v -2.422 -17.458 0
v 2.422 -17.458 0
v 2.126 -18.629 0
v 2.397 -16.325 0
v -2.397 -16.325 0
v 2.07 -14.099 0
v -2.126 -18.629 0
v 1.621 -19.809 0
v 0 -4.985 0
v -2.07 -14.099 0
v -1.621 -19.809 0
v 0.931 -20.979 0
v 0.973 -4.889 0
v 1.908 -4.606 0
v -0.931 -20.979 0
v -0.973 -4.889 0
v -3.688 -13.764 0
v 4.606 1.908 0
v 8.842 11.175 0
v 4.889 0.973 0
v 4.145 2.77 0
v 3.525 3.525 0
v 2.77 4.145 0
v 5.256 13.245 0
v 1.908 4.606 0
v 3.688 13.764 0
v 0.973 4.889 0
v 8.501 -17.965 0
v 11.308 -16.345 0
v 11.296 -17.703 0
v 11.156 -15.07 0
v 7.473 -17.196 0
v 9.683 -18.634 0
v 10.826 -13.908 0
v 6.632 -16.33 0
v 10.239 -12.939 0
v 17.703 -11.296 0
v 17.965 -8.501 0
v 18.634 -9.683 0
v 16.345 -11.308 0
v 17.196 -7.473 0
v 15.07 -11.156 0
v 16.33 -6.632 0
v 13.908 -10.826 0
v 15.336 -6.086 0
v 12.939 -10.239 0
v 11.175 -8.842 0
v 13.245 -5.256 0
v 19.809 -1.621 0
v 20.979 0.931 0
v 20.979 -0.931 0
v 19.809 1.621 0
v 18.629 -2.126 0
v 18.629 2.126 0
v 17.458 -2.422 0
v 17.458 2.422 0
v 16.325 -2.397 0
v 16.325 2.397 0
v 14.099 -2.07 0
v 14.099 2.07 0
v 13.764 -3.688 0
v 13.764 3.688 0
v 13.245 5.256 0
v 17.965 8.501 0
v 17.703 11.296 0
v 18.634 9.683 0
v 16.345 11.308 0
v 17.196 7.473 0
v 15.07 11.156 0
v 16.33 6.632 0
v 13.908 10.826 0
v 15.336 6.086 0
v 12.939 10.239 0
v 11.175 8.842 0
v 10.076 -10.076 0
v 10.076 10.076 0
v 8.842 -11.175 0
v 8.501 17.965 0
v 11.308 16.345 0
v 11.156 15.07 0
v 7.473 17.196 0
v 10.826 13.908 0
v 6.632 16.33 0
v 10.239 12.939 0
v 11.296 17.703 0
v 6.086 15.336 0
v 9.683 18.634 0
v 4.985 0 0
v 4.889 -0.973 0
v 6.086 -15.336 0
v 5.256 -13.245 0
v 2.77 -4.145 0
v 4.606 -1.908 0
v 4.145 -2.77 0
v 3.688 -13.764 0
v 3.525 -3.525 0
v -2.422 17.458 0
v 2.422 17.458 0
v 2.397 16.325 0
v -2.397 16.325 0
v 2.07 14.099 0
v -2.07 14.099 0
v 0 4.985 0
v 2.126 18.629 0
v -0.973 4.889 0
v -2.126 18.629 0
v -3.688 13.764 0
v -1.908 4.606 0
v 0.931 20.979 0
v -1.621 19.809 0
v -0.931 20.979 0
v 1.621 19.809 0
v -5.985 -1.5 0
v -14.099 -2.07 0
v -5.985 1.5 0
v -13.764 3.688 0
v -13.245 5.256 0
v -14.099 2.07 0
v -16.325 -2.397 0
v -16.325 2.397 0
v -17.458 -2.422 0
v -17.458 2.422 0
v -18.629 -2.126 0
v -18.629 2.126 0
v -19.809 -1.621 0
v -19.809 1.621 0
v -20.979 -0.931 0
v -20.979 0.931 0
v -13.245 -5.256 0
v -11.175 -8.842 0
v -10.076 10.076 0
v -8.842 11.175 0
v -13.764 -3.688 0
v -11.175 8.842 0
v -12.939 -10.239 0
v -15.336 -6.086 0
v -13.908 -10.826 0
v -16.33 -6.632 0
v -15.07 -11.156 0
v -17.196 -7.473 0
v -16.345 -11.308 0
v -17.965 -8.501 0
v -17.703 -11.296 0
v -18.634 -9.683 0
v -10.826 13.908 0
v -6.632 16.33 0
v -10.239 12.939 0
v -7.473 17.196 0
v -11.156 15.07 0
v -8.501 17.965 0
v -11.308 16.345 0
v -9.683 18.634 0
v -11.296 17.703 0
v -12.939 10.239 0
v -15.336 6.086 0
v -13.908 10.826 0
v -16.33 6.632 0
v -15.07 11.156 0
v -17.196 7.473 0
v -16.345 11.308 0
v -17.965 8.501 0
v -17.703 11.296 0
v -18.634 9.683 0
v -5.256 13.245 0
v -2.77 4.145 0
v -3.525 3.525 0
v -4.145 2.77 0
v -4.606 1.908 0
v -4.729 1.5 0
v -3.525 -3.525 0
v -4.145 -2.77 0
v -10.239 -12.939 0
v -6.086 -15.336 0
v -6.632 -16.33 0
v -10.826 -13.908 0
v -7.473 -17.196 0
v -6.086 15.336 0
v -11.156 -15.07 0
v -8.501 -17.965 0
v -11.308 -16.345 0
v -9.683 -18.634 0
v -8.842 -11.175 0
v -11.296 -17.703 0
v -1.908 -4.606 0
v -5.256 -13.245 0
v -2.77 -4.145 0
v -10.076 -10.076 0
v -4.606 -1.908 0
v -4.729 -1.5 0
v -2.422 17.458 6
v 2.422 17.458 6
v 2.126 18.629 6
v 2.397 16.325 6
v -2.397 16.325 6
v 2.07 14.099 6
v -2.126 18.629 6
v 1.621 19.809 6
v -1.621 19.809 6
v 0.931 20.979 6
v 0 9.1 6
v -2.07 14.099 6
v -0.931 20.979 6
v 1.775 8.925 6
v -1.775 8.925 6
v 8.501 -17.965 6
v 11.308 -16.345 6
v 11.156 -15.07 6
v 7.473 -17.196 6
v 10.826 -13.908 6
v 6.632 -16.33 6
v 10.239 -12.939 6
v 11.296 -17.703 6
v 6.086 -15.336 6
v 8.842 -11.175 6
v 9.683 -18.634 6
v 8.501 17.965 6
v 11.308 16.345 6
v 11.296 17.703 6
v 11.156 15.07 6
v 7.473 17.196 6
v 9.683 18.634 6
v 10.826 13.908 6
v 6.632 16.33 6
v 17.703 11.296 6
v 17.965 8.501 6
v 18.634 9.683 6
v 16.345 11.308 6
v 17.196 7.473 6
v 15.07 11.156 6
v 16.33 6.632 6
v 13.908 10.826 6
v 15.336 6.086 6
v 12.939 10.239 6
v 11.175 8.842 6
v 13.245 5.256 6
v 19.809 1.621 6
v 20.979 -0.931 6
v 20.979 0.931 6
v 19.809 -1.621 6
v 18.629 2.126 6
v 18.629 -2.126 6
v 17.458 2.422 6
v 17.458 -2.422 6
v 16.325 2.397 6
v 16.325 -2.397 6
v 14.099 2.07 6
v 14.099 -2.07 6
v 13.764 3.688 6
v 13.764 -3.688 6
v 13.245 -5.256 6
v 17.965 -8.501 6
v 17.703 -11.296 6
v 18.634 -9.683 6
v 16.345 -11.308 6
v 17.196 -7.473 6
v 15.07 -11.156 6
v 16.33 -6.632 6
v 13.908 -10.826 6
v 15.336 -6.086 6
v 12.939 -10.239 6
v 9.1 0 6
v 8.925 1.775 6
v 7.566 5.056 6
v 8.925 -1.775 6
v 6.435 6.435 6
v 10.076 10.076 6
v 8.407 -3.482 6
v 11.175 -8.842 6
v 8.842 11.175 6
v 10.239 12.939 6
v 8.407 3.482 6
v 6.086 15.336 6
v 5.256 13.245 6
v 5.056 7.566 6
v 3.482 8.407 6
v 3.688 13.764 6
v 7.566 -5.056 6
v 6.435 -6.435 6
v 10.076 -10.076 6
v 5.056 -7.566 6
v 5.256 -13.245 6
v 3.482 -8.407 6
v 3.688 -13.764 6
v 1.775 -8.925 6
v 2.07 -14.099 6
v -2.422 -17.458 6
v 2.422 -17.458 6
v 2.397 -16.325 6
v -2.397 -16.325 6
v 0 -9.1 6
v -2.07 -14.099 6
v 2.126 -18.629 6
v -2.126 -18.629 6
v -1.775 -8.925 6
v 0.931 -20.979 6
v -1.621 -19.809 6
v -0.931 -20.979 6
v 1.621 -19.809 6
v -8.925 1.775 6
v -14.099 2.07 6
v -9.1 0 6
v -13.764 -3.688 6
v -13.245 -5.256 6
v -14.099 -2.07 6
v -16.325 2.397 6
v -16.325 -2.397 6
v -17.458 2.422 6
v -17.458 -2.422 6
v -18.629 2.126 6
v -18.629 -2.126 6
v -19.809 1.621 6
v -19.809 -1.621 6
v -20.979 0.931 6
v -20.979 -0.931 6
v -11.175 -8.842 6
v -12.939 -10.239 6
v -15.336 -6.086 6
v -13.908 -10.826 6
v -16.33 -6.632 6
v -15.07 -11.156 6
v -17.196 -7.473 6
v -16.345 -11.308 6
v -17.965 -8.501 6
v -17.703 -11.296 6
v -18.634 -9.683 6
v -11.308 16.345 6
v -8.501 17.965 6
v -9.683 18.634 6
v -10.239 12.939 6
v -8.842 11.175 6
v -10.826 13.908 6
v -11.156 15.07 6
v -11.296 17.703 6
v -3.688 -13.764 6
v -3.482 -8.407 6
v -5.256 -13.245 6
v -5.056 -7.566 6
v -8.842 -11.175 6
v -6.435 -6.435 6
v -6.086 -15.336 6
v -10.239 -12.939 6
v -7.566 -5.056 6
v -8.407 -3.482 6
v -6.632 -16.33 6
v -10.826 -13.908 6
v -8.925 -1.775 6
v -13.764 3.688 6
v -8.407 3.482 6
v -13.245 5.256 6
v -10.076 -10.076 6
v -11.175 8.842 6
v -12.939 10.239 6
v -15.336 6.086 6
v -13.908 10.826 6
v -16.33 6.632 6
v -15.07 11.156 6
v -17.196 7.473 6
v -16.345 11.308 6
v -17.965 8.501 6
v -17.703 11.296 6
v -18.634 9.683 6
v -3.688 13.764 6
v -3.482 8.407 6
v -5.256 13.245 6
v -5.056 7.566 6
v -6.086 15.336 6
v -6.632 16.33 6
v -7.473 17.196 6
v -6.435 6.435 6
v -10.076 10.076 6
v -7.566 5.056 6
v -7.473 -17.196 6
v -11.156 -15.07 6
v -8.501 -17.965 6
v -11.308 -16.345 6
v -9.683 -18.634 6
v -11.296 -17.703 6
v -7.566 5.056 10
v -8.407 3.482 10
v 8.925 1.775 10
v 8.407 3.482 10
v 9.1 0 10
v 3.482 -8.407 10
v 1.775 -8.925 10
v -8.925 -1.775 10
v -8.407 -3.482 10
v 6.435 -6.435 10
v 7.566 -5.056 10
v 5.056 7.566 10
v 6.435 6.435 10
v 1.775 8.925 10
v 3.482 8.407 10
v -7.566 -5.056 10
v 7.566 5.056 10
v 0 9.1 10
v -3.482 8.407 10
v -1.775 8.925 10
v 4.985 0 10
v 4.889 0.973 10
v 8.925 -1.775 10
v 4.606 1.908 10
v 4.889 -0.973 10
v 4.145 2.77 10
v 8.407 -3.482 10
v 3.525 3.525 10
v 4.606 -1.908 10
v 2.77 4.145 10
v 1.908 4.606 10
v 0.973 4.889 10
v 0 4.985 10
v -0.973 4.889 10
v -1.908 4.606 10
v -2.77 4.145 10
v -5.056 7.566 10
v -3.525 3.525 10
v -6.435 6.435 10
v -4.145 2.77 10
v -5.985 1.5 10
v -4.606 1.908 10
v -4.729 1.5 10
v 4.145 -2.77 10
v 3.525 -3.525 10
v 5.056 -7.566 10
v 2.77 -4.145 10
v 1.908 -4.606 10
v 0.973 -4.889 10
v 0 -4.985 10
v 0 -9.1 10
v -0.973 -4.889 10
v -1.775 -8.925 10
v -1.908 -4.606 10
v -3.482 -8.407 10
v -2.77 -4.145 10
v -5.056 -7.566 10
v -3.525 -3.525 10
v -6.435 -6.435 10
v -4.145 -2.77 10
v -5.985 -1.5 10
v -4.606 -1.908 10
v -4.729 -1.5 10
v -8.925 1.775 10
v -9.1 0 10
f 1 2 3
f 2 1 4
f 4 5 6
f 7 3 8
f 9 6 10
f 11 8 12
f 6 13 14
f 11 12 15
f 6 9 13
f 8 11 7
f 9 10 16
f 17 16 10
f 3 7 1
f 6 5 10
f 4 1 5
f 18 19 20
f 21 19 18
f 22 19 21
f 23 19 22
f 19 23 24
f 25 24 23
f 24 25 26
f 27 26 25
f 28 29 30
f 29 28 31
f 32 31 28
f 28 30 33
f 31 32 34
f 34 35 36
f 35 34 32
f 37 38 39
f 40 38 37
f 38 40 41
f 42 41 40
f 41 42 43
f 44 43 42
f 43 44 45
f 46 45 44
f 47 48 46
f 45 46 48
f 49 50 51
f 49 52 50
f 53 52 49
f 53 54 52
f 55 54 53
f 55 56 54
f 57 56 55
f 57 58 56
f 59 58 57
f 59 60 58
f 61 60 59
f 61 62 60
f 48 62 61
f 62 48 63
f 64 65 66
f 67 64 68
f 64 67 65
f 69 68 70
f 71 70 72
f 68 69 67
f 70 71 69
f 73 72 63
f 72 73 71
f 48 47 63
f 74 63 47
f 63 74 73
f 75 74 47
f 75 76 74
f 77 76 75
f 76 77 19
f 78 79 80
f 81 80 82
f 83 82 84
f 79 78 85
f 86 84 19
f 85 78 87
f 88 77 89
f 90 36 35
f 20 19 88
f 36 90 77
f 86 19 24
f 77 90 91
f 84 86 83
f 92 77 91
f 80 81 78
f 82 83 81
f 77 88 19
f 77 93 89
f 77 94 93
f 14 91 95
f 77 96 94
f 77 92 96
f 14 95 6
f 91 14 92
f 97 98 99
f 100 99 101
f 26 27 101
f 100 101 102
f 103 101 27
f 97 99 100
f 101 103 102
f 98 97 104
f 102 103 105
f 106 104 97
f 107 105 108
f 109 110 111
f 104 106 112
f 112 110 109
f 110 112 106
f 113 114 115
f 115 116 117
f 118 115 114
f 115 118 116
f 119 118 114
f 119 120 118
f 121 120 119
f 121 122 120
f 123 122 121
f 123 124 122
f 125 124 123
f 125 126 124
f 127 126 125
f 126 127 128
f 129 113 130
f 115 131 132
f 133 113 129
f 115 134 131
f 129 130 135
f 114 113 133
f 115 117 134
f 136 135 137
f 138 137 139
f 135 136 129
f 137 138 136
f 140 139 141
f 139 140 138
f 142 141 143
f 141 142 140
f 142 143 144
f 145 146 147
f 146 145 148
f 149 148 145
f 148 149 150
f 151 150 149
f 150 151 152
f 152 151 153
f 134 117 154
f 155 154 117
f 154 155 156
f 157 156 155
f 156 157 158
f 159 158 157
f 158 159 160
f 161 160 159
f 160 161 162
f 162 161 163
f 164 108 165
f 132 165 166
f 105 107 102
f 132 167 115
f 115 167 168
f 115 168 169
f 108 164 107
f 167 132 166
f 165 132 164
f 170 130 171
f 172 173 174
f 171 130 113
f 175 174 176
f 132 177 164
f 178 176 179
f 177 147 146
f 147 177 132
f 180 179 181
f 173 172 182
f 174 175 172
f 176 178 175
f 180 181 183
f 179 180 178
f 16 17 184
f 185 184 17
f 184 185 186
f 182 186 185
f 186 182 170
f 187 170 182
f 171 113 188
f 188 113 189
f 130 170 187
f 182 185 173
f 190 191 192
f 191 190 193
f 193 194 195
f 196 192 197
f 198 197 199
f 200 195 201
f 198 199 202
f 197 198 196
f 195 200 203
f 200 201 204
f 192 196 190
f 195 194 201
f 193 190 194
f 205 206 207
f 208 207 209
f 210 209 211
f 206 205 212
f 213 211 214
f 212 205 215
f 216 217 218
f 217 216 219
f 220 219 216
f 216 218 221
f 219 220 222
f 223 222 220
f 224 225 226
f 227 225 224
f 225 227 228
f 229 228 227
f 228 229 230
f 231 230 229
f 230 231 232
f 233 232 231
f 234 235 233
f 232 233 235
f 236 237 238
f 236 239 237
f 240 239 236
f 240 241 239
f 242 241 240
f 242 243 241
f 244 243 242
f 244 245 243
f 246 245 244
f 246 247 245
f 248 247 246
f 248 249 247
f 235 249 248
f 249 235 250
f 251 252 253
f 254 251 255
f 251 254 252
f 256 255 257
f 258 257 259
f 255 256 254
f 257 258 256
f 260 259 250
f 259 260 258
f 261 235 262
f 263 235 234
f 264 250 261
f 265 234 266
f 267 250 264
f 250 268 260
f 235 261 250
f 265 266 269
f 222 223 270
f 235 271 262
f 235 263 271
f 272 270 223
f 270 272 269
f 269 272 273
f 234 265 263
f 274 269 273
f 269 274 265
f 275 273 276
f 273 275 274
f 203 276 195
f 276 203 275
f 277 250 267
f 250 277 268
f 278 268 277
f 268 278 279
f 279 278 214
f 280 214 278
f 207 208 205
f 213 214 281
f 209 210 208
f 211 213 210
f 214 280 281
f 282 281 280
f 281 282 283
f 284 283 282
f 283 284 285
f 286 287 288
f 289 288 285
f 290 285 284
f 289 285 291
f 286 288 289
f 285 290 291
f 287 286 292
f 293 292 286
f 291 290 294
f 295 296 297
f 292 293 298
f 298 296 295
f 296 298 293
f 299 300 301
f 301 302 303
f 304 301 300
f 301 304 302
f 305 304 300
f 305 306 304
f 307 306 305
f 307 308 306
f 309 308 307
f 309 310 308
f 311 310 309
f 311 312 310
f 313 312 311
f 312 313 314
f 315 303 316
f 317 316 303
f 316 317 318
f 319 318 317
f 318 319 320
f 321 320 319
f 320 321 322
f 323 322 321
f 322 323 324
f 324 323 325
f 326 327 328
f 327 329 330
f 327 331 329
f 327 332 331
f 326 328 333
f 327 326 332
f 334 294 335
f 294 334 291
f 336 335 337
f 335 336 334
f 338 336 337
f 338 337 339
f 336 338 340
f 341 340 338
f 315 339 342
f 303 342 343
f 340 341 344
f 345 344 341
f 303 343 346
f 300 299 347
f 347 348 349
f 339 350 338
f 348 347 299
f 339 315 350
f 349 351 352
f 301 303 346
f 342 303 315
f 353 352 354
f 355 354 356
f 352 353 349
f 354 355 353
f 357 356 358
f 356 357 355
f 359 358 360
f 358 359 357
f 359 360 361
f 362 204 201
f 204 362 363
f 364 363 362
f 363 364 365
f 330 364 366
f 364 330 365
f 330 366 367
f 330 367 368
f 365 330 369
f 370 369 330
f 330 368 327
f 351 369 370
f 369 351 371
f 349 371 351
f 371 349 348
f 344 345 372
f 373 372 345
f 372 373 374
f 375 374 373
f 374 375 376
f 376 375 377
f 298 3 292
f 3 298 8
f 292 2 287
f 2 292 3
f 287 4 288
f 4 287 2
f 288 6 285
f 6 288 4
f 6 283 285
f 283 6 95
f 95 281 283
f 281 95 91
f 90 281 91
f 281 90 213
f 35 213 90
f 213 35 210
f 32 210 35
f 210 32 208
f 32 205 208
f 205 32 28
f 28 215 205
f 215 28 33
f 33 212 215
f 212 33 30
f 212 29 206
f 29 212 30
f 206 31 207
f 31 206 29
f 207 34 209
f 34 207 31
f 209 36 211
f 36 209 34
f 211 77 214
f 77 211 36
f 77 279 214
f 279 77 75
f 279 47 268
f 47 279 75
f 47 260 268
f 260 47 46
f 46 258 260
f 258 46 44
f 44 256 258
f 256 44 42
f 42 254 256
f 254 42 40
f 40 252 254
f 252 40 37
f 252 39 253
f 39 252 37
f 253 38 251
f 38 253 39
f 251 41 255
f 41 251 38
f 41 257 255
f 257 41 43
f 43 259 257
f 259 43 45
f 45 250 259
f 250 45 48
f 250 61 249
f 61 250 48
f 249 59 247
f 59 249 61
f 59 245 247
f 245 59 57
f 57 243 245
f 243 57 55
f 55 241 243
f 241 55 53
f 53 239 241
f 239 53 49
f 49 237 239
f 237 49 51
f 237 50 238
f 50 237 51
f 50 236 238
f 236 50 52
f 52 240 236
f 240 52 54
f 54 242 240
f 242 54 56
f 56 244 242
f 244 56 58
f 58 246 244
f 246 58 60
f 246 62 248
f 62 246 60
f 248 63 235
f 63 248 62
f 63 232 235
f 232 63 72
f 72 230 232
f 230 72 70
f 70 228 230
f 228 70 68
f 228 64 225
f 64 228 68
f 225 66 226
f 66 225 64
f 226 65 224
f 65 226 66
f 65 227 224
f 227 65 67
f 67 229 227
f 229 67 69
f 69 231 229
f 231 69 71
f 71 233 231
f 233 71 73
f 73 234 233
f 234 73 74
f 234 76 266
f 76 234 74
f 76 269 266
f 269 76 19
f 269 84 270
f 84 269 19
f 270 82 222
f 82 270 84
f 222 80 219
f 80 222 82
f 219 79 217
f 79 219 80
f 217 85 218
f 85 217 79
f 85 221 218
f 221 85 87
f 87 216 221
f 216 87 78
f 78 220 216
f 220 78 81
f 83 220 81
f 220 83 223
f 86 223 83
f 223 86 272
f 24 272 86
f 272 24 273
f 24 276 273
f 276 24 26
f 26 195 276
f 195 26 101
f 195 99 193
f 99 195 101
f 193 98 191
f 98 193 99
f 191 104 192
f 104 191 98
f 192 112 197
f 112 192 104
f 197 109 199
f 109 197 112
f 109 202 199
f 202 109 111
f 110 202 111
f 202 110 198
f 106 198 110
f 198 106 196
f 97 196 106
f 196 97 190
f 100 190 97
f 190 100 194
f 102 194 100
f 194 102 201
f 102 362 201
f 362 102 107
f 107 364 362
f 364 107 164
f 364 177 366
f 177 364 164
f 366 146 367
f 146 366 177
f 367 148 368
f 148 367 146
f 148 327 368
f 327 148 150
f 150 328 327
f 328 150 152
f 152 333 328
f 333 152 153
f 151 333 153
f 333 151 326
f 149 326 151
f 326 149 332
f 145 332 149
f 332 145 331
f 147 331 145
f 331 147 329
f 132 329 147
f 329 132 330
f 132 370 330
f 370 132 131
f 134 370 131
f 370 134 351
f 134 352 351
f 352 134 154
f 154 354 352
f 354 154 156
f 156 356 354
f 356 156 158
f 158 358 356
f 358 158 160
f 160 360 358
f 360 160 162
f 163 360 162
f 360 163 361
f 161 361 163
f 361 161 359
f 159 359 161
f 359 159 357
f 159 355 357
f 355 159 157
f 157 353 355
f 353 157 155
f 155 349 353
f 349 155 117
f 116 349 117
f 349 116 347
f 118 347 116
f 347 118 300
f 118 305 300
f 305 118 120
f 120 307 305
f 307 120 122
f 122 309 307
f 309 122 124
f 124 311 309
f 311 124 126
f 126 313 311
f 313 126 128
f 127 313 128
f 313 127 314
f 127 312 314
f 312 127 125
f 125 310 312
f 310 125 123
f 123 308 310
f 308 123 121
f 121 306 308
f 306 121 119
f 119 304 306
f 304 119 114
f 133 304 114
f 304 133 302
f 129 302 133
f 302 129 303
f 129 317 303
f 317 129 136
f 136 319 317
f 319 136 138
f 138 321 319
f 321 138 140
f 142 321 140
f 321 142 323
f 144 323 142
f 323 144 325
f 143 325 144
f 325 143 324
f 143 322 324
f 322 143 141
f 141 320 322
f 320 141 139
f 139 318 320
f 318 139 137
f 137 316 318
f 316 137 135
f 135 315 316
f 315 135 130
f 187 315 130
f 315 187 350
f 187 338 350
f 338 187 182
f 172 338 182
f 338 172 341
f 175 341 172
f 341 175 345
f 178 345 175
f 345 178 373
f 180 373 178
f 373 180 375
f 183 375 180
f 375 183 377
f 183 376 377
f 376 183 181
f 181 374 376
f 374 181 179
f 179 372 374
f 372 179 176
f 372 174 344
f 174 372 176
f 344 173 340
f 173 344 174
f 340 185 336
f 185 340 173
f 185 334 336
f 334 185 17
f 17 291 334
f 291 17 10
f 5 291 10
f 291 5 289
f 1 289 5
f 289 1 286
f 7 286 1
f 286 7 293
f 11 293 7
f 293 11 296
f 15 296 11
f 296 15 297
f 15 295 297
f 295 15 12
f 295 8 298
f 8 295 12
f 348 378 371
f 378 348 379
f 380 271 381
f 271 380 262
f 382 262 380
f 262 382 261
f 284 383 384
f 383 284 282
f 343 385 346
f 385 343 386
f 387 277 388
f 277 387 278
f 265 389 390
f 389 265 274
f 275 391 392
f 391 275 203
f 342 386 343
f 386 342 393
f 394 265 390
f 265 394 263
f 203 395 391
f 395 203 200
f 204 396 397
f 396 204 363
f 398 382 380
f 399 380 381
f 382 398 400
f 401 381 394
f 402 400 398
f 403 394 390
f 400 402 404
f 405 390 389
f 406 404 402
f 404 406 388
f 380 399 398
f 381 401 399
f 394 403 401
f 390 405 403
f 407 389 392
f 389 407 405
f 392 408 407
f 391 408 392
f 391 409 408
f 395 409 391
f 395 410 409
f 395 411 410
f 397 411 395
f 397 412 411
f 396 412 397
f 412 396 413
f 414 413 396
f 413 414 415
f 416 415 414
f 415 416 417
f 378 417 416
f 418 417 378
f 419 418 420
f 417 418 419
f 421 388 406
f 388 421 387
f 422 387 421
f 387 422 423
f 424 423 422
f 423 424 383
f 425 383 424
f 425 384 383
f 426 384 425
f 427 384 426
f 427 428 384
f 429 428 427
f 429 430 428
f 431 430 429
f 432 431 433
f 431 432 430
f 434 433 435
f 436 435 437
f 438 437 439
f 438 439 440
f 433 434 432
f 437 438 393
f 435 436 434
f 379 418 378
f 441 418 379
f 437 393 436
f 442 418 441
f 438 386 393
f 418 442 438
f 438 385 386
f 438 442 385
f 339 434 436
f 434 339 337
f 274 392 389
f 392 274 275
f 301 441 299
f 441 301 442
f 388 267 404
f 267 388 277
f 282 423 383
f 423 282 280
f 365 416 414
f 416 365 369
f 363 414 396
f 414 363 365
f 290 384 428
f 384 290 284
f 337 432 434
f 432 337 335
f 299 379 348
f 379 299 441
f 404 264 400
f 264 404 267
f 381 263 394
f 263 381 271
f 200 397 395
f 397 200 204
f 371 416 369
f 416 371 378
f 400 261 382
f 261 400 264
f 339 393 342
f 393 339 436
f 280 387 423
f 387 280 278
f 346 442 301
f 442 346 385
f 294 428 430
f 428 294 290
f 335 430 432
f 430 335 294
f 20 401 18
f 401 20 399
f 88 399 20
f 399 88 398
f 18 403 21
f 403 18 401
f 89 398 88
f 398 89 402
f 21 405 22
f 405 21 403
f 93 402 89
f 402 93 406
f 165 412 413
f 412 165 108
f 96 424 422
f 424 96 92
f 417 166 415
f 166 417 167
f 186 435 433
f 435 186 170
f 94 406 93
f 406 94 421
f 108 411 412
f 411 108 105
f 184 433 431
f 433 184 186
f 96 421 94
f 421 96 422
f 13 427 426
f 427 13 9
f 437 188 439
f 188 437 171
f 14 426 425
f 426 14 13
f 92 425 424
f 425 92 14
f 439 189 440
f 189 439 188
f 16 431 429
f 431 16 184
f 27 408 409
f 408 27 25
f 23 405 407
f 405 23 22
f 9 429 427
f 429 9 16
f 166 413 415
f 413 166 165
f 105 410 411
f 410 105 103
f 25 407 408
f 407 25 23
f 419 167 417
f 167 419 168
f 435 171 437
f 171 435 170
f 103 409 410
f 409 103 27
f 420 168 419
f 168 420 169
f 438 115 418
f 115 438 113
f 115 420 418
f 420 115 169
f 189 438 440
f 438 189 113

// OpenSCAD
$fn = 32;

// ----------------------------------------------------------------------
// Spur gear: m=3 z=12, 42 mm tip diameter x 10 mm
// ----------------------------------------------------------------------

// --- parameters (mm) ---
modul = 3;                // module
n_teeth = 12;             // number of teeth
width = 6;                // face width
pa = 20;                  // pressure angle, deg
shaft_d = 9.97;           // shaft bore
boss_d = 18.2;            // hub diameter
boss_h = 4;               // hub above the face
key_w = 3;                // keyway width
key_h = 1.4;              // keyway depth

/* --- involute profile --- */
pitch_r = modul * n_teeth / 2;
base_r = pitch_r * cos(pa);
tip_r = pitch_r + modul;
root_r = pitch_r - 1.25 * modul;
flank_steps = 6;

function inv_deg(a) = (tan(a) - a * PI / 180) * 180 / PI;
function flank_r(i) = root_r + (tip_r - root_r) * i / flank_steps;
function half_angle(r) = 90 / n_teeth + inv_deg(pa) - inv_deg(acos(min(1, base_r / r)));
function tooth_pt(k, i, side) =
    let (r = flank_r(i), a = k * 360 / n_teeth + side * half_angle(r))
    [r * cos(a), r * sin(a)];

module tooth_profile() {
  polygon(points = [
    for (k = [0 : n_teeth - 1])
      each [
        for (i = [0 : flank_steps]) tooth_pt(k, i, -1),
        for (i = [flank_steps : -1 : 0]) tooth_pt(k, i, 1),
        let (ta = (k + 0.5) * 360 / n_teeth)
          [root_r * cos(ta), root_r * sin(ta)]
      ]
  ]);
}

module gear_disc() {
  linear_extrude(height = width) tooth_profile();
}

module hub_boss() {
  translate([0, 0, width - 1]) cylinder(h = boss_h + 1, d = boss_d);
}

difference() {
  union() {
    gear_disc();
    hub_boss();
  }
  translate([0, 0, -1]) cylinder(h = width + boss_h + 3, d = shaft_d);
  /* keyway on the bore */
  translate([-shaft_d / 2 - 1, -key_w / 2, -1]) cube([key_h + 1, key_w, width + boss_h + 3]);
}
